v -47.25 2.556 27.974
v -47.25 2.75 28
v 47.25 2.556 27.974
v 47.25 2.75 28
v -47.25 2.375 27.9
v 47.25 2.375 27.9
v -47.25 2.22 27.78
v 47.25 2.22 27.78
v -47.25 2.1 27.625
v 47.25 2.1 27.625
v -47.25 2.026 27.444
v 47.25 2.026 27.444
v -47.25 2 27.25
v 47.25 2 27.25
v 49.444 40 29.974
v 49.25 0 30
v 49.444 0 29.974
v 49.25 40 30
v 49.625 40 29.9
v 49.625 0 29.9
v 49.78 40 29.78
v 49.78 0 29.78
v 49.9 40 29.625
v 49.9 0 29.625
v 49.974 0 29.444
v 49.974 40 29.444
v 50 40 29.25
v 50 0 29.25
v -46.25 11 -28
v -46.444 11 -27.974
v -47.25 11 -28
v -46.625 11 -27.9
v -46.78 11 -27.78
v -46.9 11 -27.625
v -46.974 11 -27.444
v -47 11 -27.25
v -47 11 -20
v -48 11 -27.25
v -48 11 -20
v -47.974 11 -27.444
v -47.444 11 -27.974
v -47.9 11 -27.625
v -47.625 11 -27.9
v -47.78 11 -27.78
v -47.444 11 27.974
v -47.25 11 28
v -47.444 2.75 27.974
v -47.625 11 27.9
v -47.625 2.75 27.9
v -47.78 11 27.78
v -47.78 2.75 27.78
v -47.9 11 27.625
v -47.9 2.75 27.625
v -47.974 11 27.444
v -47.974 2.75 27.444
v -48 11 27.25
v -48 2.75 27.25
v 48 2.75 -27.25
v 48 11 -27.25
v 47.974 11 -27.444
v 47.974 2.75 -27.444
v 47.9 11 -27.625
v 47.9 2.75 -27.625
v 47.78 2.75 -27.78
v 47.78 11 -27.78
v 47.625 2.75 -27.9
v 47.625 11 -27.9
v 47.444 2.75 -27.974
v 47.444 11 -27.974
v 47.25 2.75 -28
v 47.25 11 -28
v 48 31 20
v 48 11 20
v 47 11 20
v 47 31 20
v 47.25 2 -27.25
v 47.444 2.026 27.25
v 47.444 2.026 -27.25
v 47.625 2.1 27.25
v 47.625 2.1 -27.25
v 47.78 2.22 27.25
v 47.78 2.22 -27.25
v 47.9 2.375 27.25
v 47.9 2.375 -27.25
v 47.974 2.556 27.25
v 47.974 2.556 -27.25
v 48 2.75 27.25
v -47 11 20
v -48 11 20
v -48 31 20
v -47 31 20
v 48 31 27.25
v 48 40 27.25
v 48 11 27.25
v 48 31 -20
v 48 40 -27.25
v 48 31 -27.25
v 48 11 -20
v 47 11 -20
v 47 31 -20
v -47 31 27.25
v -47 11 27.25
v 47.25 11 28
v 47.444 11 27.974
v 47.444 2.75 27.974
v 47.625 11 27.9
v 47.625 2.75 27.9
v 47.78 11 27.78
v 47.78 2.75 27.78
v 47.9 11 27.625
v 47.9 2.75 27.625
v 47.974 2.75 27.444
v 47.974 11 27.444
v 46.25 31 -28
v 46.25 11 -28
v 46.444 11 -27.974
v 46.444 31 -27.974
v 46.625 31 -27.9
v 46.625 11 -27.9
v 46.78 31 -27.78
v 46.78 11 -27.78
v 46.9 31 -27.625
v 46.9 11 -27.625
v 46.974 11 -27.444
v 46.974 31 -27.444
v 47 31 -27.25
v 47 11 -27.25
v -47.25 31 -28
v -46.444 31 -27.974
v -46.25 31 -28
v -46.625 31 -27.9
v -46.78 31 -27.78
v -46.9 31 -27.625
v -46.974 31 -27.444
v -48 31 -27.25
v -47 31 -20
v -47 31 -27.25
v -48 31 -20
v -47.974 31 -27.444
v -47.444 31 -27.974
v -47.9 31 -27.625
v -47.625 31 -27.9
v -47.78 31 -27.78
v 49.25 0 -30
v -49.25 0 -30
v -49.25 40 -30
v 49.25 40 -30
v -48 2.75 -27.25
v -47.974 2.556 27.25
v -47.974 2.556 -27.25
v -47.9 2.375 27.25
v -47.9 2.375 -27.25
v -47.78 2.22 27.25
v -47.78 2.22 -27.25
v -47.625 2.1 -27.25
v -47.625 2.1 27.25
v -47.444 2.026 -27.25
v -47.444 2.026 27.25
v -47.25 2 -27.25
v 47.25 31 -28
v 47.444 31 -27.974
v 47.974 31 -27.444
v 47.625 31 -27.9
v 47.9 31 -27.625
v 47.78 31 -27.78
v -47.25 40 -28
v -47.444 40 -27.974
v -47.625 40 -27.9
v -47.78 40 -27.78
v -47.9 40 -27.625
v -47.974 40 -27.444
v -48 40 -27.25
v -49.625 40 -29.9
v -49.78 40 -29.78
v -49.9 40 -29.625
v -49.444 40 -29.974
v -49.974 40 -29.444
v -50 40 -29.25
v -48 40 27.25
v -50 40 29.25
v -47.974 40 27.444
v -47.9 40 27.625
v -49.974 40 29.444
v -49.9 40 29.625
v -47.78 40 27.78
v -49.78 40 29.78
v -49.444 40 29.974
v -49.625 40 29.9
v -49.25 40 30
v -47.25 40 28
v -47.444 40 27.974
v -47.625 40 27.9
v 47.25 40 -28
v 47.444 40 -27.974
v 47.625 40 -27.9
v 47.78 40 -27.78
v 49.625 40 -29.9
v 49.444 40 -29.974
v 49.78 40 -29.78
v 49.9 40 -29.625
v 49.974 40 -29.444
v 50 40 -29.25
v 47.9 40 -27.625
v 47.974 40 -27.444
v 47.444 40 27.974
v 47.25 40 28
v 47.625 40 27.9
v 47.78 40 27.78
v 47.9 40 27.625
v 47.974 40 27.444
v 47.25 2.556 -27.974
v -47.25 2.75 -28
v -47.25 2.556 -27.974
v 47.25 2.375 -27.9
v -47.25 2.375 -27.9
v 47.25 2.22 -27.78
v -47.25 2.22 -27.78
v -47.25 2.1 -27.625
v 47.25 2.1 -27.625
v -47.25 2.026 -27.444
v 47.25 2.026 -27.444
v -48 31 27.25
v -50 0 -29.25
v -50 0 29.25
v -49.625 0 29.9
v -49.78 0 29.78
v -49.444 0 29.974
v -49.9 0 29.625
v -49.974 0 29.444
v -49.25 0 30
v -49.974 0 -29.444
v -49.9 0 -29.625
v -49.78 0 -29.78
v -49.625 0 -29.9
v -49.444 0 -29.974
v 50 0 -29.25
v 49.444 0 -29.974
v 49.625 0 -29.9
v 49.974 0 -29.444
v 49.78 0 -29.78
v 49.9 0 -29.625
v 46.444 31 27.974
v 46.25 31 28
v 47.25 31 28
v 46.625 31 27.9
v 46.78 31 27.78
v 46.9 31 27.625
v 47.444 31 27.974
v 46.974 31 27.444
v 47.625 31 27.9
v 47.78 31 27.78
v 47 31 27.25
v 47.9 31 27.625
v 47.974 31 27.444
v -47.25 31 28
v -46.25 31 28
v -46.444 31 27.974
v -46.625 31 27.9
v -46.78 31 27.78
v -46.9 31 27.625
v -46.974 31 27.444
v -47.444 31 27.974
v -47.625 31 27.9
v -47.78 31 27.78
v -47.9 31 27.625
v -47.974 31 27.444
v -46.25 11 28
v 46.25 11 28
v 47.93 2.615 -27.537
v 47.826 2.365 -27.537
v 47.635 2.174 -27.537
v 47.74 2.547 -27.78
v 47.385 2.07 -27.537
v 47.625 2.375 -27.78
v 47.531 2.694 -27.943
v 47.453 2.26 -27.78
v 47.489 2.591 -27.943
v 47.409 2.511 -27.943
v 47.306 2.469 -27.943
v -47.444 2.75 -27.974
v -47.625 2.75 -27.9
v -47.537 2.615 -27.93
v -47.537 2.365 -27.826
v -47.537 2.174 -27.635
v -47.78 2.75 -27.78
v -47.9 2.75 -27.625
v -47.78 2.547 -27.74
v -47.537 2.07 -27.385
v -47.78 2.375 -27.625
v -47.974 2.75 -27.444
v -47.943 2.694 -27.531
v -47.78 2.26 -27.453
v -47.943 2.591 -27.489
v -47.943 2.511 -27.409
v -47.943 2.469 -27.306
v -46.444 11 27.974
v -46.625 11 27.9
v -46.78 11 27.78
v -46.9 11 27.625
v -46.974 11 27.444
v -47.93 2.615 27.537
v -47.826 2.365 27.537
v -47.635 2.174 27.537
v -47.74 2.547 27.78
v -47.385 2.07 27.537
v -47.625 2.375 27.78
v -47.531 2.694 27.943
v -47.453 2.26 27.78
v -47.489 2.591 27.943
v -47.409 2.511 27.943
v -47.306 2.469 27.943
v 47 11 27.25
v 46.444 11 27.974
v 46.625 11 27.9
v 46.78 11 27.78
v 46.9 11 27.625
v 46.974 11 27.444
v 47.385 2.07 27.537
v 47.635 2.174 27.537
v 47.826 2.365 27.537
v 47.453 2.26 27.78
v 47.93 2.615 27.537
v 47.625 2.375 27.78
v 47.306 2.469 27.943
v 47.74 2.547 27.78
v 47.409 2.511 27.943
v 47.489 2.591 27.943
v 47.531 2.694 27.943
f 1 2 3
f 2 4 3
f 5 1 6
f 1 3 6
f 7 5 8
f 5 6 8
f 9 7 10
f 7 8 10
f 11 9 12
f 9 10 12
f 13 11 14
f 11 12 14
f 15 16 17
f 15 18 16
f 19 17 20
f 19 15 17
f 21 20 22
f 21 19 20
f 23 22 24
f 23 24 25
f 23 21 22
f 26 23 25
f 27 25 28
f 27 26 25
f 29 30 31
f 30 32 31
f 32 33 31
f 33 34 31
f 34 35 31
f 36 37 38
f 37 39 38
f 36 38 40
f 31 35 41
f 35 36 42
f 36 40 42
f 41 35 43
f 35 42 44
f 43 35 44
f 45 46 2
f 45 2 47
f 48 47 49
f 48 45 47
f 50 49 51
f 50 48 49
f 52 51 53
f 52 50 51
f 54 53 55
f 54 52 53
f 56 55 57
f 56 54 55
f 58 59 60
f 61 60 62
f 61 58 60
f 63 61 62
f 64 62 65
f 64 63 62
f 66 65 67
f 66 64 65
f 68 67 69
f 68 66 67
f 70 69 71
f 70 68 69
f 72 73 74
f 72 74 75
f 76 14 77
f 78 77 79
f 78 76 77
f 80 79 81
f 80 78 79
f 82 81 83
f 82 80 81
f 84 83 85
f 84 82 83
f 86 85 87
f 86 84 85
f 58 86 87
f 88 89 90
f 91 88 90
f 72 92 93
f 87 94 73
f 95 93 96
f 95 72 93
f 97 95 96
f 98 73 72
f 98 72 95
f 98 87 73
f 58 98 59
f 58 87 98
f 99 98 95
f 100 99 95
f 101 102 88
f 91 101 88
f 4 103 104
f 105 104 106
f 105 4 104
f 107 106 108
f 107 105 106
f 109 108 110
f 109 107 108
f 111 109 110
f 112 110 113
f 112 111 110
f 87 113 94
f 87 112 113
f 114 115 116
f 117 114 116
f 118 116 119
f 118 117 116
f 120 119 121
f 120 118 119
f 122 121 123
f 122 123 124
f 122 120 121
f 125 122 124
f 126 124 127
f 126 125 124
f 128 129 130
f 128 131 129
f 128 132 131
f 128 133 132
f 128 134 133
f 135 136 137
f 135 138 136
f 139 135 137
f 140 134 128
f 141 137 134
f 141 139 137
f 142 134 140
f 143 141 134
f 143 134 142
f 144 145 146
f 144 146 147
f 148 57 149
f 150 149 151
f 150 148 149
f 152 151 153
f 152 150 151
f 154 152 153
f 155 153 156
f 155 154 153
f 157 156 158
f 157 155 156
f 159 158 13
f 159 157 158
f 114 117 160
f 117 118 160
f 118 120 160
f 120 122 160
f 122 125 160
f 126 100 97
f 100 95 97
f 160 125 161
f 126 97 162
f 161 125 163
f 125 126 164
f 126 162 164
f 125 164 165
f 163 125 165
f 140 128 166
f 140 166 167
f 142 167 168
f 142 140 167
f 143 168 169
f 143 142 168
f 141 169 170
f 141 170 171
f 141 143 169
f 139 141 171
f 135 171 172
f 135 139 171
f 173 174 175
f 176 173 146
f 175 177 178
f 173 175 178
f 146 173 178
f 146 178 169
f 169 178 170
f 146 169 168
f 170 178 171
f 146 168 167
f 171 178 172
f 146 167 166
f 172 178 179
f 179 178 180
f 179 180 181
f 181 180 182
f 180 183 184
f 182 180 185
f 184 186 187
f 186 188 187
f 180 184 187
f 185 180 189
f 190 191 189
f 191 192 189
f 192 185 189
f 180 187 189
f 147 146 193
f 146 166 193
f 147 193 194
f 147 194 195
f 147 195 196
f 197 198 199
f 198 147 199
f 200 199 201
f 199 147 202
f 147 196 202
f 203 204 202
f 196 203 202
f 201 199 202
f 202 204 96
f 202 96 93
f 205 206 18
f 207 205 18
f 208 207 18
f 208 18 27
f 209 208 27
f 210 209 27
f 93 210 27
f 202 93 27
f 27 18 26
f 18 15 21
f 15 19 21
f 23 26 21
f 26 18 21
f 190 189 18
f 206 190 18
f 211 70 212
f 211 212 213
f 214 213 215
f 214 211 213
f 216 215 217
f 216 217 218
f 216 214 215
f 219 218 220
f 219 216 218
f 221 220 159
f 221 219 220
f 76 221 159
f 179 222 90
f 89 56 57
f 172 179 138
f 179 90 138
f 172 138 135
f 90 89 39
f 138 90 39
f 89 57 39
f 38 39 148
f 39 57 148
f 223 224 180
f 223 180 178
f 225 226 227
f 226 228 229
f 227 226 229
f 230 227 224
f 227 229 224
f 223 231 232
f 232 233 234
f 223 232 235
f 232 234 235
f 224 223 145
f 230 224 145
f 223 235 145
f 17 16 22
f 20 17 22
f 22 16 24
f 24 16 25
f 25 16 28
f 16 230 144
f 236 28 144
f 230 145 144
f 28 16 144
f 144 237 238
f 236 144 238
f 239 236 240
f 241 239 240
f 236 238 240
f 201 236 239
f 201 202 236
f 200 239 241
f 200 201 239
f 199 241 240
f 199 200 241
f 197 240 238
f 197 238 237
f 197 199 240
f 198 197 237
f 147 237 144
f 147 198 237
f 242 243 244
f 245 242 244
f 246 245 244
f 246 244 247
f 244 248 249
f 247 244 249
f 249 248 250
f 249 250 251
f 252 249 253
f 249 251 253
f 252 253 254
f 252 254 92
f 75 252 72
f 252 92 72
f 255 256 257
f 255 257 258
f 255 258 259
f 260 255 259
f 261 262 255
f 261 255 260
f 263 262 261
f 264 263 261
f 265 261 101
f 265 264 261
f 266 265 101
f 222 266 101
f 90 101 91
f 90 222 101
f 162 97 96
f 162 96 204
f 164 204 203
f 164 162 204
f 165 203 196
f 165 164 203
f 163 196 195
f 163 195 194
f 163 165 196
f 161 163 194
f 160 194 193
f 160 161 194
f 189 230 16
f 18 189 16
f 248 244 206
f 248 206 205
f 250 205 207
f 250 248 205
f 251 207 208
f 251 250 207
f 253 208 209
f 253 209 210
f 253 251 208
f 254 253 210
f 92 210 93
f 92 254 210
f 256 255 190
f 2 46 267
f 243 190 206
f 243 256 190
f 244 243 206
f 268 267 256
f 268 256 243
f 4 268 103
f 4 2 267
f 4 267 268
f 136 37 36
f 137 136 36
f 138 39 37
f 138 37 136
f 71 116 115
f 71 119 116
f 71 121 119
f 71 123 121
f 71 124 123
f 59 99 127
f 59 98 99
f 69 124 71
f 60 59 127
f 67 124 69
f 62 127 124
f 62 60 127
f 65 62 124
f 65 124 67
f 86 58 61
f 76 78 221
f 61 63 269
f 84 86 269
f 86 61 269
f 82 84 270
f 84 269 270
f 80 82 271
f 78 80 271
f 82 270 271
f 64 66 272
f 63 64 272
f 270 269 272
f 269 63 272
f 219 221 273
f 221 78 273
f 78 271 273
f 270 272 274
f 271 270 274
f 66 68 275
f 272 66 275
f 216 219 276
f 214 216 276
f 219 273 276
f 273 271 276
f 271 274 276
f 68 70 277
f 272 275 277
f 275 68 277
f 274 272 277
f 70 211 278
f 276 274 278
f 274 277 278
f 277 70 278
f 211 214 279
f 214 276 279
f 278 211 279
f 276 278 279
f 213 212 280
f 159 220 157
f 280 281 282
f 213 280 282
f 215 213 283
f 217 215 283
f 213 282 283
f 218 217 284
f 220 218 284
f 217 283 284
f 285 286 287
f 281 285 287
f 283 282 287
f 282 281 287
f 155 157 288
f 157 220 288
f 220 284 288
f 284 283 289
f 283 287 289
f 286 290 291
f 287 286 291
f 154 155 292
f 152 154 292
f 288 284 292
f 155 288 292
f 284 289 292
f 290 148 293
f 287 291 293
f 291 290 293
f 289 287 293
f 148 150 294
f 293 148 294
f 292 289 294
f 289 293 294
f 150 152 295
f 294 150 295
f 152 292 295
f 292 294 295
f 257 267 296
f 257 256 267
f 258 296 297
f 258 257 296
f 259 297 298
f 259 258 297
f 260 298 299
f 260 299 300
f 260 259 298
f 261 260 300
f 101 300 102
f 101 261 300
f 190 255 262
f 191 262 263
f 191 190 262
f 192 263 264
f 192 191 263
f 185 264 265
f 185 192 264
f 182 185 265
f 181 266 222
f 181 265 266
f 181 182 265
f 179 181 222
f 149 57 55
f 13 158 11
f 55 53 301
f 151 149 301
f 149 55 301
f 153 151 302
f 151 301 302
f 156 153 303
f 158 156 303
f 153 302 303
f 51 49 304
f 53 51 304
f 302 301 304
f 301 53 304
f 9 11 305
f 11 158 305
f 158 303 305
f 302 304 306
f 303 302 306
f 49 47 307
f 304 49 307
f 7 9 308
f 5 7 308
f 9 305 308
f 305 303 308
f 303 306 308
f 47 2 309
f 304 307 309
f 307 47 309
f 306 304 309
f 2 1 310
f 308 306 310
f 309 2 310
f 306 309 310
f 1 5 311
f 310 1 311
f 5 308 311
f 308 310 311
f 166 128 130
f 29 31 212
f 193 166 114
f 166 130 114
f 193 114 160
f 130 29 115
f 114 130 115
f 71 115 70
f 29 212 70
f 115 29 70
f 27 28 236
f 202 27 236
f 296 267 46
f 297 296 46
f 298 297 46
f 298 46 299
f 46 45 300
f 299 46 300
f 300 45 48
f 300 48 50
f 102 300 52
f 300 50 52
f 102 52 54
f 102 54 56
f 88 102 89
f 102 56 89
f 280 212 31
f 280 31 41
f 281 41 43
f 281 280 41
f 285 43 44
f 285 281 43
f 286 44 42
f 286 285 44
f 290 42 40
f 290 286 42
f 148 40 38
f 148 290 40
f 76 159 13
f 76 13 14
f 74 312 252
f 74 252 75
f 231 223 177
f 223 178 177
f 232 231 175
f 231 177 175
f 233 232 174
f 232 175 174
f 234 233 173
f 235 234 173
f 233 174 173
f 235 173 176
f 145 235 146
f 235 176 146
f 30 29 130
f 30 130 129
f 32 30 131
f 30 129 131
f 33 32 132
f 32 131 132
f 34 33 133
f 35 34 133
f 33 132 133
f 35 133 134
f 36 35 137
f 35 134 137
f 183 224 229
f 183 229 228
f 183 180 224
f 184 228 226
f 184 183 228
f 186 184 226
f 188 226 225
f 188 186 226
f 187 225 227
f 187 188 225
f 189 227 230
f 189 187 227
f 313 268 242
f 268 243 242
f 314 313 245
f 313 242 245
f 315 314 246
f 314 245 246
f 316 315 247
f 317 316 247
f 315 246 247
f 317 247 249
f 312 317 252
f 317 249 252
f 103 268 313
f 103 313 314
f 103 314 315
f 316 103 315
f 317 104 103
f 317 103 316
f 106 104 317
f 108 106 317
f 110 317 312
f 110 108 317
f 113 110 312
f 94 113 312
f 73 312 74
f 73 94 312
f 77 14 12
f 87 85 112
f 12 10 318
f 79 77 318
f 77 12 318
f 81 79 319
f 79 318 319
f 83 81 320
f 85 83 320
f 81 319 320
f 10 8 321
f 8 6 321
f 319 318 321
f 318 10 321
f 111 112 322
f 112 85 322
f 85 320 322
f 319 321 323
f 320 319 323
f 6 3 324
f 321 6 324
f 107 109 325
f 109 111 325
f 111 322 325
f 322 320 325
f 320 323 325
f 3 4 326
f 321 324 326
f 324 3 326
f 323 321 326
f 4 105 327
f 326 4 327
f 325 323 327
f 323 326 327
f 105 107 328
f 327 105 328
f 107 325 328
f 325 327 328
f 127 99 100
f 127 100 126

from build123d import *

# Parameters (mm, degrees)
SKETCH10_W          = 100
SKETCH10_H          = 60
BOSS_EXTRUDE2_DEPTH = 40
SHELL1_T            = -2
SKETCH11_W          = 8
SKETCH11_H          = 20
BOSS_EXTRUDE3_DEPTH = 1
FILLET1_R           = 0.75
FILLET2_R           = 0.75
FILLET3_R           = 0.75
FILLET4_R           = 0.75
FILLET5_R           = 0.75


with BuildPart() as part:
    # Sketch10 → Boss-Extrude2 (new body)
    with BuildSketch(Plane(origin=(0, 0, 0), x_dir=(1, 0, 0), z_dir=(0, 1, 0))):
        Rectangle(SKETCH10_W, SKETCH10_H)
    extrude(amount=BOSS_EXTRUDE2_DEPTH)

    # Shell1
    shell1_openings = [part.faces().sort_by_distance(p)[0] for p in [
        (0, 40, 0),
    ]]
    offset(amount=SHELL1_T, openings=shell1_openings, kind=Kind.INTERSECTION)

    # Sketch11 → Boss-Extrude3 (add)
    with BuildSketch(Plane(origin=(-48, 0, 0), x_dir=(0, 0, -1), z_dir=(1, 0, 0))):
        with Locations((24, 21)):
            Rectangle(SKETCH11_W, SKETCH11_H)
        with Locations((-24, 21)):
            Rectangle(SKETCH11_W, SKETCH11_H)
    boss_extrude3 = extrude(amount=BOSS_EXTRUDE3_DEPTH)

    # Fillet1
    fillet1_edges = [part.edges().sort_by_distance(p)[0] for p in [
        (-47, 21, -28),
        (-47, 21, 28),
    ]]
    fillet(fillet1_edges, radius=FILLET1_R)

    # Mirror1: Boss-Extrude3 across plane
    add(boss_extrude3.mirror(Plane(origin=(0, 0, 0), x_dir=(0, 0, 1), z_dir=(1, 0, 0))))

    # Fillet2
    fillet2_edges = [part.edges().sort_by_distance(p)[0] for p in [
        (47, 21, -28),
        (47, 21, 28),
    ]]
    fillet(fillet2_edges, radius=FILLET2_R)

    # Fillet3
    fillet3_edges = [part.edges().sort_by_distance(p)[0] for p in [
        (48, 2, 0),
        (0, 2, -28),
        (-48, 2, 0),
        (0, 2, 28),
    ]]
    fillet(fillet3_edges, radius=FILLET3_R)

    # Fillet4
    fillet4_edges = [part.edges().sort_by_distance(p)[0] for p in [
        (50, 20, 30),
        (-50, 20, 30),
        (-50, 20, -30),
        (50, 20, -30),
    ]]
    fillet(fillet4_edges, radius=FILLET4_R)

    # Fillet5
    # the kernel refuses this fillet: 0.75 mm, written as the material it adds along each edge
    with BuildSketch(Plane(origin=(-47.25, 2.75, -27.25), x_dir=(0, 0, -1), z_dir=(-1, 0, 0))) as fillet5_piece_1_section:
        Polygon((0, 0), (FILLET5_R, 0), (FILLET5_R, FILLET5_R), (0, FILLET5_R), align=None)
    fillet5_piece_1 = extrude(amount=FILLET5_R, mode=Mode.PRIVATE)
    fillet5_piece_1 = fillet5_piece_1 - Plane(origin=(-47.25, 2.75, -27.25), x_dir=(0, 0.7071067811865475, 0.7071067811865475), z_dir=(-1, 0, 0)) * Sphere(FILLET5_R, mode=Mode.PRIVATE)
    add(fillet5_piece_1)
    with BuildSketch(Plane(origin=(47.25, 2.75, -27.25), x_dir=(1, 0, 0), z_dir=(0, 0, -1))) as fillet5_piece_2_section:
        Polygon((0, 0), (FILLET5_R, 0), (FILLET5_R, FILLET5_R), (0, FILLET5_R), align=None)
    fillet5_piece_2 = extrude(amount=FILLET5_R, mode=Mode.PRIVATE)
    fillet5_piece_2 = fillet5_piece_2 - Plane(origin=(47.25, 2.75, -27.25), x_dir=(-0.7071067811865475, 0.7071067811865475, 0), z_dir=(0, 0, -1)) * Sphere(FILLET5_R, mode=Mode.PRIVATE)
    add(fillet5_piece_2)
    with BuildSketch(Plane(origin=(-47.25, 2.75, 27.25), x_dir=(-1, 0, 0), z_dir=(0, 0, 1))) as fillet5_piece_3_section:
        Polygon((0, 0), (FILLET5_R, 0), (FILLET5_R, FILLET5_R), (0, FILLET5_R), align=None)
    fillet5_piece_3 = extrude(amount=FILLET5_R, mode=Mode.PRIVATE)
    fillet5_piece_3 = fillet5_piece_3 - Plane(origin=(-47.25, 2.75, 27.25), x_dir=(0.7071067811865475, 0.7071067811865475, 0), z_dir=(0, 0, 1)) * Sphere(FILLET5_R, mode=Mode.PRIVATE)
    add(fillet5_piece_3)
    with BuildSketch(Plane(origin=(47.25, 2.75, 27.25), x_dir=(1, 0, 0), z_dir=(0, 0, 1))) as fillet5_piece_4_section:
        Polygon((0, 0), (FILLET5_R, 0), (FILLET5_R, -FILLET5_R), (0, -FILLET5_R), align=None)
    fillet5_piece_4 = extrude(amount=FILLET5_R, mode=Mode.PRIVATE)
    fillet5_piece_4 = fillet5_piece_4 - Plane(origin=(47.25, 2.75, 27.25), x_dir=(-0.7071067811865475, 0.7071067811865475, 0), z_dir=(0, 0, 1)) * Sphere(FILLET5_R, mode=Mode.PRIVATE)
    add(fillet5_piece_4)
    with BuildSketch(Plane(origin=(48, 29.125, 28), x_dir=(-1, 0, 0), z_dir=(0, 1, 0)), Plane(origin=(-48, 40, 28), x_dir=(1, 0, 0), z_dir=(0, -1, 0))) as fillet5_piece_5:
        with BuildLine():
            CenterArc((FILLET5_R, -FILLET5_R), FILLET5_R, 90, 90)
            Line((0, -FILLET5_R), (0, 0))
            Line((0, 0), (FILLET5_R, 0))
        make_face()
    extrude(amount=10.875)
    with BuildSketch(Plane(origin=(48, 29.125, -28), x_dir=(-1, 0, 0), z_dir=(0, 1, 0)), Plane(origin=(-48, 29.125, -28), x_dir=(0, 0, 1), z_dir=(0, 1, 0))) as fillet5_piece_6:
        with BuildLine():
            CenterArc((FILLET5_R, FILLET5_R), FILLET5_R, 180, 90)
            Line((0, FILLET5_R), (0, 0))
            Line((0, 0), (FILLET5_R, 0))
        make_face()
    extrude(amount=10.875)
    with BuildSketch(Plane(origin=(-48, 2.75, -28), x_dir=(0, 0, 1), z_dir=(0, 1, 0)), Plane(origin=(48, 2.75, -28), x_dir=(-1, 0, 0), z_dir=(0, 1, 0))) as fillet5_piece_7:
        with BuildLine():
            CenterArc((FILLET5_R, FILLET5_R), FILLET5_R, 180, 90)
            Line((0, FILLET5_R), (0, 0))
            Line((0, 0), (FILLET5_R, 0))
        make_face()
    extrude(amount=10.125)
    with BuildSketch(Plane(origin=(-48, 12.875, 28), x_dir=(1, 0, 0), z_dir=(0, -1, 0)), Plane(origin=(48, 2.75, 28), x_dir=(-1, 0, 0), z_dir=(0, 1, 0))) as fillet5_piece_8:
        with BuildLine():
            CenterArc((FILLET5_R, -FILLET5_R), FILLET5_R, 90, 90)
            Line((0, -FILLET5_R), (0, 0))
            Line((0, 0), (FILLET5_R, 0))
        make_face()
    extrude(amount=10.125)


solid = part.part
